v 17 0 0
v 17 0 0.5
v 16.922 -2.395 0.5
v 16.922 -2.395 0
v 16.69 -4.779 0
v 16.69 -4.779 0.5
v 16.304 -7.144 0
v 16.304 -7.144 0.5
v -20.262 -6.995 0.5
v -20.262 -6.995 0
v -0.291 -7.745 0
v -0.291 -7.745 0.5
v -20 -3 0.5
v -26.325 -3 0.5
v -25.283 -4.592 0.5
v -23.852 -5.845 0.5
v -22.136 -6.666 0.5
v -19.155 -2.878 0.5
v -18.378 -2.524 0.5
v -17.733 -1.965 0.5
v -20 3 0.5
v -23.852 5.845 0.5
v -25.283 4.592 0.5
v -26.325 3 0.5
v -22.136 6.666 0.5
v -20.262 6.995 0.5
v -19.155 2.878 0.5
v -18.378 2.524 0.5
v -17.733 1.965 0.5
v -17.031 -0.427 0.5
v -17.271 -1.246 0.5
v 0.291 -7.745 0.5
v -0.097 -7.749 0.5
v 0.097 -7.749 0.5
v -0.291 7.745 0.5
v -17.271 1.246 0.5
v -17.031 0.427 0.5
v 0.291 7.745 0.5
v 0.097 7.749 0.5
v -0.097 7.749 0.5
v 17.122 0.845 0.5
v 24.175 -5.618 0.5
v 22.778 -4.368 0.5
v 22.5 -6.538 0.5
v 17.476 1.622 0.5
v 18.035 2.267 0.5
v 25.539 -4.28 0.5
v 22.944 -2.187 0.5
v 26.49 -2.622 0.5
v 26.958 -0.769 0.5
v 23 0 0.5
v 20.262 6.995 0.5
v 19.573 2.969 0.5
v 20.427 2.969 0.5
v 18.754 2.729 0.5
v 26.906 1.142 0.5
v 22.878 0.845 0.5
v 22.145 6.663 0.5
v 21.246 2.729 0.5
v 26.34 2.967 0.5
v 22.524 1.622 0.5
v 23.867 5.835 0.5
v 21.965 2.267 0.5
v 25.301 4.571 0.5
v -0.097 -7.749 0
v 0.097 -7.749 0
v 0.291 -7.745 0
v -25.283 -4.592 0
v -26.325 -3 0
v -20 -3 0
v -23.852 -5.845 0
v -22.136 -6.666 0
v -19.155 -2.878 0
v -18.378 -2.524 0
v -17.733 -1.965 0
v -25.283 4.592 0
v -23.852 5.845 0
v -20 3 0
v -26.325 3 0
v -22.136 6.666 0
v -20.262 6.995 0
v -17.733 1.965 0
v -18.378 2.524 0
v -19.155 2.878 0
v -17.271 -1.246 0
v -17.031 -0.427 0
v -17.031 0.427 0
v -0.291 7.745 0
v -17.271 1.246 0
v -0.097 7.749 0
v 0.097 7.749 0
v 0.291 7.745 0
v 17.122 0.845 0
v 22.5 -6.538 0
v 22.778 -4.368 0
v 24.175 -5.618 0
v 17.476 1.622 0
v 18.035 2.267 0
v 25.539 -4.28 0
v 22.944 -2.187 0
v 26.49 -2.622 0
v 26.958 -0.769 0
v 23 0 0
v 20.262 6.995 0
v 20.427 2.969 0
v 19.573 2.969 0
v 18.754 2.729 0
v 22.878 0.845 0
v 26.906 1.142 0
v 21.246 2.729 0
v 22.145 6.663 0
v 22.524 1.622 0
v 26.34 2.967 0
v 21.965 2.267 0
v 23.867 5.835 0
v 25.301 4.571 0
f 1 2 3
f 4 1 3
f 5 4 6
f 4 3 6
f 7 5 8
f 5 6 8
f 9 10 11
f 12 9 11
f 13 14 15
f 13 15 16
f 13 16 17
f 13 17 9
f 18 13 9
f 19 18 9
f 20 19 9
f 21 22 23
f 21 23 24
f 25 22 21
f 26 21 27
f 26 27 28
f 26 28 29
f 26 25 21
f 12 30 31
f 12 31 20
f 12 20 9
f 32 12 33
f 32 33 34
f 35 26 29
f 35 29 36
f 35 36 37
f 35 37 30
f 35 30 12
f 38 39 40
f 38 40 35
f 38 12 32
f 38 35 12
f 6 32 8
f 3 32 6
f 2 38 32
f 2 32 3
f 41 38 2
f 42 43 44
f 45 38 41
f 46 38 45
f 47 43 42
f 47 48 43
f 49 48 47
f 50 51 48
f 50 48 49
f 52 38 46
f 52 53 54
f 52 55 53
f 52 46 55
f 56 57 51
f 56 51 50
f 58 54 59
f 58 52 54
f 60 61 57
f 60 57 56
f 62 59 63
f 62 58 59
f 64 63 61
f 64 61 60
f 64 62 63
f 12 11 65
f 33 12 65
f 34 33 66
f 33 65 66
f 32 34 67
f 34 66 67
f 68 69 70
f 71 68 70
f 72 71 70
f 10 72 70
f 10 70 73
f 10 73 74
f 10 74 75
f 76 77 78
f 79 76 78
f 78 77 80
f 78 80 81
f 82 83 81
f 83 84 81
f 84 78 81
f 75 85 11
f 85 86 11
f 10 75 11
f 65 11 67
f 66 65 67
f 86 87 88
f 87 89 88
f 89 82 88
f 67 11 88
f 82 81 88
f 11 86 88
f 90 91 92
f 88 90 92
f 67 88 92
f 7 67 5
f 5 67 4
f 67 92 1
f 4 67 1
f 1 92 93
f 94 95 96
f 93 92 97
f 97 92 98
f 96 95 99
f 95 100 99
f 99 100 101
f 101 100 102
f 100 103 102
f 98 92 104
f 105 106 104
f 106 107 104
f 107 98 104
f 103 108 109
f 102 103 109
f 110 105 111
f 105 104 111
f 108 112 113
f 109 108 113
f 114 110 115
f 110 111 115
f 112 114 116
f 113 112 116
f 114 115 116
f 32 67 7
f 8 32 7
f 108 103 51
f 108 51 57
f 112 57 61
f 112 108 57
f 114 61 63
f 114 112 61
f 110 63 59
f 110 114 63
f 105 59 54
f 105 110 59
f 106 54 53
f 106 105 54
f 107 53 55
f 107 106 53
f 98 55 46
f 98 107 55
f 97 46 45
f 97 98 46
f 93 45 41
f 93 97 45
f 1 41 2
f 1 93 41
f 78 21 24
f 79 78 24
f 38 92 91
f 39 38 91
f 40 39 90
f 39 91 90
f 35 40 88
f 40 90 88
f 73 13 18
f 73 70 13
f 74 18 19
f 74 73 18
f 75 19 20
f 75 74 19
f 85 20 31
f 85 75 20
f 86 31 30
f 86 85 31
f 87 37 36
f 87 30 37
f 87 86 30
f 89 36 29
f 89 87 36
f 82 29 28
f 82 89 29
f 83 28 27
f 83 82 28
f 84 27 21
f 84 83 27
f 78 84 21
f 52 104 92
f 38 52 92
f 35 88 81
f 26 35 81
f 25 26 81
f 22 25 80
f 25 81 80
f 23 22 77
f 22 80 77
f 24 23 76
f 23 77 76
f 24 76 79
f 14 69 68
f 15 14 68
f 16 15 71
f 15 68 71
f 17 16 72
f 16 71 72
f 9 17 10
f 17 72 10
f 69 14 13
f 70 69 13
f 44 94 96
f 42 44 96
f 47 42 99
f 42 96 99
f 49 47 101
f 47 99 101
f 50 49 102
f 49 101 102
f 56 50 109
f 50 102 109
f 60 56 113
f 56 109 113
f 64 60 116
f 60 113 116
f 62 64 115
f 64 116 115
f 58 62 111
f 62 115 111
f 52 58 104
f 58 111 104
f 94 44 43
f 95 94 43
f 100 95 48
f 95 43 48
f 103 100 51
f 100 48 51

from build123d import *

# Parameters (mm, degrees)
SZKIC1_R                    = 3
DODANIE_WYCI_GNI_CIE1_DEPTH = 0.5
WYTNIJ_WYCI_GNI_CIE1_DEPTH  = 1.5
WYTNIJ_WYCI_GNI_CIE3_DEPTH  = 1.5


with BuildPart() as part:
    # Szkic1 → Dodanie-wyciągnięcie1 (new body)
    with BuildSketch(Plane.XY):
        with BuildLine():
            Line((-0.290625, 7.744548864), (-20.2625, 6.995076393))
            ThreePointArc((-20.2625, 6.995076393), (-27, 0), (-20.2625, -6.995076393))
            Line((-20.2625, -6.995076393), (-0.290625, -7.744548864))
            ThreePointArc((-0.290625, -7.744548864), (0, -7.75), (0.290625, -7.744548864))
            Line((0.290625, -7.744548864), (20.2625, -6.995076393))
            ThreePointArc((20.2625, -6.995076393), (27, 0), (20.2625, 6.995076393))
            Line((20.2625, 6.995076393), (0.290625, 7.744548864))
            ThreePointArc((0.290625, 7.744548864), (0, 7.75), (-0.290625, 7.744548864))
        make_face()
        with Locations((-20, 0)):
            Circle(SZKIC1_R, mode=Mode.SUBTRACT)
        with Locations((20, 0)):
            Circle(SZKIC1_R, mode=Mode.SUBTRACT)
    extrude(amount=DODANIE_WYCI_GNI_CIE1_DEPTH)

    # Szkic2 → Wytnij-wyciągnięcie1 (cut, through all)
    with BuildSketch(Plane.XY.offset(0.5)):
        with BuildLine():
            Line((-20, 3), (-26.32455532, 3))
            ThreePointArc((-26.32455532, 3), (-27, 0), (-26.32455532, -3))
            Line((-26.32455532, -3), (-20, -3))
            ThreePointArc((-20, -3), (-23, 0), (-20, 3))
        make_face()
    extrude(amount=-WYTNIJ_WYCI_GNI_CIE1_DEPTH, mode=Mode.SUBTRACT)

    # Szkic3 → Wytnij-wyciągnięcie3 (cut, through all)
    with BuildSketch(Plane.XY.offset(0.5)):
        with BuildLine():
            ThreePointArc((17, 0), (16.825547843, -3.588735998), (16.303836429, -7.143630766))
            Line((16.303836429, -7.143630766), (20.2625, -6.995076393))
            ThreePointArc((20.2625, -6.995076393), (21.400000598, -6.858571158), (22.5, -6.538348415))
            ThreePointArc((22.5, -6.538348415), (22.874817784, -3.278719262), (23, 0))
            ThreePointArc((23, 0), (20, -3), (17, 0))
        make_face()
    extrude(amount=-WYTNIJ_WYCI_GNI_CIE3_DEPTH, mode=Mode.SUBTRACT)


solid = part.part
